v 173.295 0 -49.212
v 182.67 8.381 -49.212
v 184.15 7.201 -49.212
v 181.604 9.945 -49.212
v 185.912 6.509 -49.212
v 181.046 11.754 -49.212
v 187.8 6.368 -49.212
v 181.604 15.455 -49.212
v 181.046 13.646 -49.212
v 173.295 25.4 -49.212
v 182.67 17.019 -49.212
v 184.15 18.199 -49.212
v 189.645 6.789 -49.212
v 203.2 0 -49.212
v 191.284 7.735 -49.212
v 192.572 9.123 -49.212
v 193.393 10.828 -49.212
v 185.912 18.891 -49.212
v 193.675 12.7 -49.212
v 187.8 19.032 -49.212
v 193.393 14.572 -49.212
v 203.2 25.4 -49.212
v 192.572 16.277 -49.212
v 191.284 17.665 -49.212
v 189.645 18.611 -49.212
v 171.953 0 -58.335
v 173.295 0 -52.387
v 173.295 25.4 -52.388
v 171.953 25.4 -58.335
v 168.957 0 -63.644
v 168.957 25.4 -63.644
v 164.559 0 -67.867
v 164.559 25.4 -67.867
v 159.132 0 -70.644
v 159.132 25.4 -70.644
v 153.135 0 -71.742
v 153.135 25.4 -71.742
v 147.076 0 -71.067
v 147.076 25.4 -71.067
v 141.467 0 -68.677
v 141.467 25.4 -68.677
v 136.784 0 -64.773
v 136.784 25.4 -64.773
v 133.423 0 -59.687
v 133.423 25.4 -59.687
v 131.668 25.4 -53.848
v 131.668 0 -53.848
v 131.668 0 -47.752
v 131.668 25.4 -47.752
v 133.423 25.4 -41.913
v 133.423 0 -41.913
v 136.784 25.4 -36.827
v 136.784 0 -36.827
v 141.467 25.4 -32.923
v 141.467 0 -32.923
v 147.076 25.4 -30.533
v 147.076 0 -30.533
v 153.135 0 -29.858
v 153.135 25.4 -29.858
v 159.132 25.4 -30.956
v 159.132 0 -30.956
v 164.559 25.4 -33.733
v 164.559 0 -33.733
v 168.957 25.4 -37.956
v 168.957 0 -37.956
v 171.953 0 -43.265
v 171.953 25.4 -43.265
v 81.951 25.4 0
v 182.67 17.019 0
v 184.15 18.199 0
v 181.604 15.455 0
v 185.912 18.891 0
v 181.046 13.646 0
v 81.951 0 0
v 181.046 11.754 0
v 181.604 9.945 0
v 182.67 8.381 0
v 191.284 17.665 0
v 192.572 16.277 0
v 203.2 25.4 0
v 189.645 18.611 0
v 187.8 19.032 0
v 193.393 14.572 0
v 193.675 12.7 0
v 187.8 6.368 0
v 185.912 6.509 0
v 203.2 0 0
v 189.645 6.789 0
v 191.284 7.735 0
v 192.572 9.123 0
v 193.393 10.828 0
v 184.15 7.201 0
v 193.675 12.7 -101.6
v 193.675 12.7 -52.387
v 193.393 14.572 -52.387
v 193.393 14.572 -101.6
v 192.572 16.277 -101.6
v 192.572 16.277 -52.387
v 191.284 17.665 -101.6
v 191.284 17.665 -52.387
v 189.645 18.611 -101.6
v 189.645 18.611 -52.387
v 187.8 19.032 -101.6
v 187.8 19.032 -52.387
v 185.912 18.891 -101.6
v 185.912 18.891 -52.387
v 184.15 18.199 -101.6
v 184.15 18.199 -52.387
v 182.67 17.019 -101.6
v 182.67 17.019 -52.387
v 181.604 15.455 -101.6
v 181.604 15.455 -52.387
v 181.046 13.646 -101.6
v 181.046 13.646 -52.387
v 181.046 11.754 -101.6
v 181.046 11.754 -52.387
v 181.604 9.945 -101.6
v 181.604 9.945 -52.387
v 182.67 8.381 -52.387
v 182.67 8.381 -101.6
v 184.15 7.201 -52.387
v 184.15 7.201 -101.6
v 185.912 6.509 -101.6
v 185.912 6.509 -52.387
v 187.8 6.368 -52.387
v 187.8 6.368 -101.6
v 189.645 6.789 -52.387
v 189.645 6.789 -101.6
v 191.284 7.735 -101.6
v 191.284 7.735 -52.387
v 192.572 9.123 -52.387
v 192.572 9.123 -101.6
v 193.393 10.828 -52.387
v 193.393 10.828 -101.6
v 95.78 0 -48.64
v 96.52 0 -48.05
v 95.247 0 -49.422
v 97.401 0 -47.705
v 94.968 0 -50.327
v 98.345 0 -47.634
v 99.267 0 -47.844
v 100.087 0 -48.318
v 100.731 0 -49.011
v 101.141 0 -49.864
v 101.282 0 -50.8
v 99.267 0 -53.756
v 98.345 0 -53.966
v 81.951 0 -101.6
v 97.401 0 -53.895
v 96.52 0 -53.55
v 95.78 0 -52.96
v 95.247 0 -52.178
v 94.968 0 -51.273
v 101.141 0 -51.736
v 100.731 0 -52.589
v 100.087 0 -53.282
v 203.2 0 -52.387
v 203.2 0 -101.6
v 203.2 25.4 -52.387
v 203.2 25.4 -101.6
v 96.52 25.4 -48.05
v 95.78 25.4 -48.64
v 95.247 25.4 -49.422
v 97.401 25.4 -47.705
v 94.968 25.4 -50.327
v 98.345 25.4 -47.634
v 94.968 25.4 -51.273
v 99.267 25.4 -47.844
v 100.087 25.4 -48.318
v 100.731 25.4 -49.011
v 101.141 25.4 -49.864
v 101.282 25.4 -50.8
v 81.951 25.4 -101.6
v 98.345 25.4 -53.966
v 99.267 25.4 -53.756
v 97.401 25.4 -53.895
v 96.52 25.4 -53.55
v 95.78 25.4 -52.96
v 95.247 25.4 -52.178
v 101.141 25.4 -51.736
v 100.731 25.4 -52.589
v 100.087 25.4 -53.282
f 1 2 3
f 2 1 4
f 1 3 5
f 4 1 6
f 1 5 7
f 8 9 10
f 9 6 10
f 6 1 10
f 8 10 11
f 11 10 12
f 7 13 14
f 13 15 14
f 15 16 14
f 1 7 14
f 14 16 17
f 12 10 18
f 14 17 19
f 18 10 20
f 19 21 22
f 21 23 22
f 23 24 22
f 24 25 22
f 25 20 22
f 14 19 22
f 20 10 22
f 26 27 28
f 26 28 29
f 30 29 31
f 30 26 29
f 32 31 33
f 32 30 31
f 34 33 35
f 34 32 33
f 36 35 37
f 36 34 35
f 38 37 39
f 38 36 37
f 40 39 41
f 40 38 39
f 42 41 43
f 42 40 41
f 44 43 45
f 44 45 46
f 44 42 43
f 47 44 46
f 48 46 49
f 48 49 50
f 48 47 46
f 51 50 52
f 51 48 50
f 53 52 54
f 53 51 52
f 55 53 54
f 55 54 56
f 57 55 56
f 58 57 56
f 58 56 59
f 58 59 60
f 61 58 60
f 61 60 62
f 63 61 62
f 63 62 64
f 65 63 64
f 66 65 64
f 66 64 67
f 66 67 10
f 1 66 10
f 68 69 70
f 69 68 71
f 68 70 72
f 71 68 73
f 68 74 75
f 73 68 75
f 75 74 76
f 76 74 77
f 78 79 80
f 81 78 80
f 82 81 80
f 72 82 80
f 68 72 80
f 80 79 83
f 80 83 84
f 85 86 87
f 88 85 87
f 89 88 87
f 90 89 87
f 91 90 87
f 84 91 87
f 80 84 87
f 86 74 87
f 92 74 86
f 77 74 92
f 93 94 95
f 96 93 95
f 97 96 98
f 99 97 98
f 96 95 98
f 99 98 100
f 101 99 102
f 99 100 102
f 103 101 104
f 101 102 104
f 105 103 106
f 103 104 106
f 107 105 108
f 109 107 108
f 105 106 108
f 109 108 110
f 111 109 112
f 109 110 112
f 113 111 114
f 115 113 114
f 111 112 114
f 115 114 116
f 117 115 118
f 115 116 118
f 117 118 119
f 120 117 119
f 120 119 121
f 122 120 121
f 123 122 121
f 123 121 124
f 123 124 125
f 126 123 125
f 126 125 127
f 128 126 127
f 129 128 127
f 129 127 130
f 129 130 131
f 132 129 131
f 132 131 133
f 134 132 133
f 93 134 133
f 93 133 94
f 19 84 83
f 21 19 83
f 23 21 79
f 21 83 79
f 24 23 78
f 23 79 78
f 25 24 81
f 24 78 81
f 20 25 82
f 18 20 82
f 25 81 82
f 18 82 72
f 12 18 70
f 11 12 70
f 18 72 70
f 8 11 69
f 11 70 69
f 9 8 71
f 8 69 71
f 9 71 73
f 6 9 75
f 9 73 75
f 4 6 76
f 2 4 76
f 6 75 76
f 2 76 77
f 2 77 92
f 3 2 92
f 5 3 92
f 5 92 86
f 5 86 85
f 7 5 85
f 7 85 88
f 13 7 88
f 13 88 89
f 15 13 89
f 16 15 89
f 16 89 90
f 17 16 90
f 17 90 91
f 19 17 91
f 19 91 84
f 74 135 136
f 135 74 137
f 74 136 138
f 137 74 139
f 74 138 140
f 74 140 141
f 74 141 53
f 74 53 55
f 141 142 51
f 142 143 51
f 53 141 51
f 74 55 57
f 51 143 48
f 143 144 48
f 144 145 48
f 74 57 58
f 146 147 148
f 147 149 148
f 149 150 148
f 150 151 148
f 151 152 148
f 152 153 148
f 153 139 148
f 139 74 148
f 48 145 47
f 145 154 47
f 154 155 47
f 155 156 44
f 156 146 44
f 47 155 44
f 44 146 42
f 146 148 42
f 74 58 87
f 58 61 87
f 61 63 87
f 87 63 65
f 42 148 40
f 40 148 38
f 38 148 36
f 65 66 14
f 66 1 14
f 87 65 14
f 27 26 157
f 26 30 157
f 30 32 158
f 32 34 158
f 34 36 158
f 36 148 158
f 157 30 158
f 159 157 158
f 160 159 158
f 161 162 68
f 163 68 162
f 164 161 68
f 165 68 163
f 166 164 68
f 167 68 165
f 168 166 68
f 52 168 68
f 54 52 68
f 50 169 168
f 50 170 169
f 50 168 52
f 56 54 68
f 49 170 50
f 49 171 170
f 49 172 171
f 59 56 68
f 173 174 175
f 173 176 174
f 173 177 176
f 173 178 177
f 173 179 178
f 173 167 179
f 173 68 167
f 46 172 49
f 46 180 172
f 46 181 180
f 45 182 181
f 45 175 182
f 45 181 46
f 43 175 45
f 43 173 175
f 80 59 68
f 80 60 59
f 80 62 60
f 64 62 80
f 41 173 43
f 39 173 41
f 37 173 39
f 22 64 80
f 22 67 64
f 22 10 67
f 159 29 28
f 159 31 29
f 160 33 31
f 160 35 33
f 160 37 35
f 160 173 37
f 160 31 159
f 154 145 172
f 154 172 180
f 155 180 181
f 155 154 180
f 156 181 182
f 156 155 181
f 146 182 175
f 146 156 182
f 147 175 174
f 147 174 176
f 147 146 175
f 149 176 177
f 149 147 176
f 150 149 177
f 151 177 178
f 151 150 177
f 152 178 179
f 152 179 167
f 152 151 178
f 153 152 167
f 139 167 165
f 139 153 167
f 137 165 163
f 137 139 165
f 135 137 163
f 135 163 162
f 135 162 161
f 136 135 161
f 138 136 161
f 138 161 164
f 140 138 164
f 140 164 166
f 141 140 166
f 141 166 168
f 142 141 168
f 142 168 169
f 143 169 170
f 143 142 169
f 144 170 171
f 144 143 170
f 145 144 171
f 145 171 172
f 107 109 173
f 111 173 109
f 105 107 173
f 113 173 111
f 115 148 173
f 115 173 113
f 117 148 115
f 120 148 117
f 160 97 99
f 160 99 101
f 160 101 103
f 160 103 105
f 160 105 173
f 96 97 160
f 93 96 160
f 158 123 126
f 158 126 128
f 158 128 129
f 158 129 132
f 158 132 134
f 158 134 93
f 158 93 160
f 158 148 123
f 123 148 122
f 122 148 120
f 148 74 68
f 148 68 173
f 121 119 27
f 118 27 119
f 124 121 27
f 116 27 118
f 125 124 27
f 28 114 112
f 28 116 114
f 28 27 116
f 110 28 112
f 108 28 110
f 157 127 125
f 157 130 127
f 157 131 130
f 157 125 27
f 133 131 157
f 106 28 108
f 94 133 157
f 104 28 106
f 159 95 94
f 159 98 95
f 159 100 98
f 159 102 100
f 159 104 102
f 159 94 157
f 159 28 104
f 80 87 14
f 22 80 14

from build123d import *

# Parameters (mm, degrees)
SKETCH1_W           = 121.249023843
SKETCH1_H           = 101.6
SKETCH1_R           = 20.955
SKETCH1_R_2         = 3.175
BOSS_EXTRUDE1_DEPTH = 25.4
SKETCH2_R           = 6.35
CUT_EXTRUDE1_DEPTH  = 102.6
SKETCH3_W           = 31.554427073
SKETCH3_H           = 3.175
CUT_EXTRUDE2_DEPTH  = 26.4


with BuildPart() as part:
    # Sketch1 → Boss-Extrude1 (new body)
    with BuildSketch(Plane(origin=(0, 0, 0), x_dir=(1, 0, 0), z_dir=(0, 1, 0))):
        with Locations((142.575488079, 50.8)):
            Rectangle(SKETCH1_W, SKETCH1_H)
        with Locations((152.4, 50.8)):
            Circle(SKETCH1_R, mode=Mode.SUBTRACT)
        with Locations((98.1075, 50.8)):
            Circle(SKETCH1_R_2, mode=Mode.SUBTRACT)
    extrude(amount=BOSS_EXTRUDE1_DEPTH)

    # Sketch2 → Cut-Extrude1 (cut, through all)
    with BuildSketch(Plane.XY):
        with Locations((187.325, 12.7)):
            Circle(SKETCH2_R)
    extrude(amount=-CUT_EXTRUDE1_DEPTH, mode=Mode.SUBTRACT)

    # Sketch3 → Cut-Extrude2 (cut, through all)
    with BuildSketch(Plane(origin=(0, 25.4, 0), x_dir=(1, 0, 0), z_dir=(0, 1, 0))):
        with Locations((187.422786464, 50.8)):
            Rectangle(SKETCH3_W, SKETCH3_H)
    extrude(amount=-CUT_EXTRUDE2_DEPTH, mode=Mode.SUBTRACT)


solid = part.part
